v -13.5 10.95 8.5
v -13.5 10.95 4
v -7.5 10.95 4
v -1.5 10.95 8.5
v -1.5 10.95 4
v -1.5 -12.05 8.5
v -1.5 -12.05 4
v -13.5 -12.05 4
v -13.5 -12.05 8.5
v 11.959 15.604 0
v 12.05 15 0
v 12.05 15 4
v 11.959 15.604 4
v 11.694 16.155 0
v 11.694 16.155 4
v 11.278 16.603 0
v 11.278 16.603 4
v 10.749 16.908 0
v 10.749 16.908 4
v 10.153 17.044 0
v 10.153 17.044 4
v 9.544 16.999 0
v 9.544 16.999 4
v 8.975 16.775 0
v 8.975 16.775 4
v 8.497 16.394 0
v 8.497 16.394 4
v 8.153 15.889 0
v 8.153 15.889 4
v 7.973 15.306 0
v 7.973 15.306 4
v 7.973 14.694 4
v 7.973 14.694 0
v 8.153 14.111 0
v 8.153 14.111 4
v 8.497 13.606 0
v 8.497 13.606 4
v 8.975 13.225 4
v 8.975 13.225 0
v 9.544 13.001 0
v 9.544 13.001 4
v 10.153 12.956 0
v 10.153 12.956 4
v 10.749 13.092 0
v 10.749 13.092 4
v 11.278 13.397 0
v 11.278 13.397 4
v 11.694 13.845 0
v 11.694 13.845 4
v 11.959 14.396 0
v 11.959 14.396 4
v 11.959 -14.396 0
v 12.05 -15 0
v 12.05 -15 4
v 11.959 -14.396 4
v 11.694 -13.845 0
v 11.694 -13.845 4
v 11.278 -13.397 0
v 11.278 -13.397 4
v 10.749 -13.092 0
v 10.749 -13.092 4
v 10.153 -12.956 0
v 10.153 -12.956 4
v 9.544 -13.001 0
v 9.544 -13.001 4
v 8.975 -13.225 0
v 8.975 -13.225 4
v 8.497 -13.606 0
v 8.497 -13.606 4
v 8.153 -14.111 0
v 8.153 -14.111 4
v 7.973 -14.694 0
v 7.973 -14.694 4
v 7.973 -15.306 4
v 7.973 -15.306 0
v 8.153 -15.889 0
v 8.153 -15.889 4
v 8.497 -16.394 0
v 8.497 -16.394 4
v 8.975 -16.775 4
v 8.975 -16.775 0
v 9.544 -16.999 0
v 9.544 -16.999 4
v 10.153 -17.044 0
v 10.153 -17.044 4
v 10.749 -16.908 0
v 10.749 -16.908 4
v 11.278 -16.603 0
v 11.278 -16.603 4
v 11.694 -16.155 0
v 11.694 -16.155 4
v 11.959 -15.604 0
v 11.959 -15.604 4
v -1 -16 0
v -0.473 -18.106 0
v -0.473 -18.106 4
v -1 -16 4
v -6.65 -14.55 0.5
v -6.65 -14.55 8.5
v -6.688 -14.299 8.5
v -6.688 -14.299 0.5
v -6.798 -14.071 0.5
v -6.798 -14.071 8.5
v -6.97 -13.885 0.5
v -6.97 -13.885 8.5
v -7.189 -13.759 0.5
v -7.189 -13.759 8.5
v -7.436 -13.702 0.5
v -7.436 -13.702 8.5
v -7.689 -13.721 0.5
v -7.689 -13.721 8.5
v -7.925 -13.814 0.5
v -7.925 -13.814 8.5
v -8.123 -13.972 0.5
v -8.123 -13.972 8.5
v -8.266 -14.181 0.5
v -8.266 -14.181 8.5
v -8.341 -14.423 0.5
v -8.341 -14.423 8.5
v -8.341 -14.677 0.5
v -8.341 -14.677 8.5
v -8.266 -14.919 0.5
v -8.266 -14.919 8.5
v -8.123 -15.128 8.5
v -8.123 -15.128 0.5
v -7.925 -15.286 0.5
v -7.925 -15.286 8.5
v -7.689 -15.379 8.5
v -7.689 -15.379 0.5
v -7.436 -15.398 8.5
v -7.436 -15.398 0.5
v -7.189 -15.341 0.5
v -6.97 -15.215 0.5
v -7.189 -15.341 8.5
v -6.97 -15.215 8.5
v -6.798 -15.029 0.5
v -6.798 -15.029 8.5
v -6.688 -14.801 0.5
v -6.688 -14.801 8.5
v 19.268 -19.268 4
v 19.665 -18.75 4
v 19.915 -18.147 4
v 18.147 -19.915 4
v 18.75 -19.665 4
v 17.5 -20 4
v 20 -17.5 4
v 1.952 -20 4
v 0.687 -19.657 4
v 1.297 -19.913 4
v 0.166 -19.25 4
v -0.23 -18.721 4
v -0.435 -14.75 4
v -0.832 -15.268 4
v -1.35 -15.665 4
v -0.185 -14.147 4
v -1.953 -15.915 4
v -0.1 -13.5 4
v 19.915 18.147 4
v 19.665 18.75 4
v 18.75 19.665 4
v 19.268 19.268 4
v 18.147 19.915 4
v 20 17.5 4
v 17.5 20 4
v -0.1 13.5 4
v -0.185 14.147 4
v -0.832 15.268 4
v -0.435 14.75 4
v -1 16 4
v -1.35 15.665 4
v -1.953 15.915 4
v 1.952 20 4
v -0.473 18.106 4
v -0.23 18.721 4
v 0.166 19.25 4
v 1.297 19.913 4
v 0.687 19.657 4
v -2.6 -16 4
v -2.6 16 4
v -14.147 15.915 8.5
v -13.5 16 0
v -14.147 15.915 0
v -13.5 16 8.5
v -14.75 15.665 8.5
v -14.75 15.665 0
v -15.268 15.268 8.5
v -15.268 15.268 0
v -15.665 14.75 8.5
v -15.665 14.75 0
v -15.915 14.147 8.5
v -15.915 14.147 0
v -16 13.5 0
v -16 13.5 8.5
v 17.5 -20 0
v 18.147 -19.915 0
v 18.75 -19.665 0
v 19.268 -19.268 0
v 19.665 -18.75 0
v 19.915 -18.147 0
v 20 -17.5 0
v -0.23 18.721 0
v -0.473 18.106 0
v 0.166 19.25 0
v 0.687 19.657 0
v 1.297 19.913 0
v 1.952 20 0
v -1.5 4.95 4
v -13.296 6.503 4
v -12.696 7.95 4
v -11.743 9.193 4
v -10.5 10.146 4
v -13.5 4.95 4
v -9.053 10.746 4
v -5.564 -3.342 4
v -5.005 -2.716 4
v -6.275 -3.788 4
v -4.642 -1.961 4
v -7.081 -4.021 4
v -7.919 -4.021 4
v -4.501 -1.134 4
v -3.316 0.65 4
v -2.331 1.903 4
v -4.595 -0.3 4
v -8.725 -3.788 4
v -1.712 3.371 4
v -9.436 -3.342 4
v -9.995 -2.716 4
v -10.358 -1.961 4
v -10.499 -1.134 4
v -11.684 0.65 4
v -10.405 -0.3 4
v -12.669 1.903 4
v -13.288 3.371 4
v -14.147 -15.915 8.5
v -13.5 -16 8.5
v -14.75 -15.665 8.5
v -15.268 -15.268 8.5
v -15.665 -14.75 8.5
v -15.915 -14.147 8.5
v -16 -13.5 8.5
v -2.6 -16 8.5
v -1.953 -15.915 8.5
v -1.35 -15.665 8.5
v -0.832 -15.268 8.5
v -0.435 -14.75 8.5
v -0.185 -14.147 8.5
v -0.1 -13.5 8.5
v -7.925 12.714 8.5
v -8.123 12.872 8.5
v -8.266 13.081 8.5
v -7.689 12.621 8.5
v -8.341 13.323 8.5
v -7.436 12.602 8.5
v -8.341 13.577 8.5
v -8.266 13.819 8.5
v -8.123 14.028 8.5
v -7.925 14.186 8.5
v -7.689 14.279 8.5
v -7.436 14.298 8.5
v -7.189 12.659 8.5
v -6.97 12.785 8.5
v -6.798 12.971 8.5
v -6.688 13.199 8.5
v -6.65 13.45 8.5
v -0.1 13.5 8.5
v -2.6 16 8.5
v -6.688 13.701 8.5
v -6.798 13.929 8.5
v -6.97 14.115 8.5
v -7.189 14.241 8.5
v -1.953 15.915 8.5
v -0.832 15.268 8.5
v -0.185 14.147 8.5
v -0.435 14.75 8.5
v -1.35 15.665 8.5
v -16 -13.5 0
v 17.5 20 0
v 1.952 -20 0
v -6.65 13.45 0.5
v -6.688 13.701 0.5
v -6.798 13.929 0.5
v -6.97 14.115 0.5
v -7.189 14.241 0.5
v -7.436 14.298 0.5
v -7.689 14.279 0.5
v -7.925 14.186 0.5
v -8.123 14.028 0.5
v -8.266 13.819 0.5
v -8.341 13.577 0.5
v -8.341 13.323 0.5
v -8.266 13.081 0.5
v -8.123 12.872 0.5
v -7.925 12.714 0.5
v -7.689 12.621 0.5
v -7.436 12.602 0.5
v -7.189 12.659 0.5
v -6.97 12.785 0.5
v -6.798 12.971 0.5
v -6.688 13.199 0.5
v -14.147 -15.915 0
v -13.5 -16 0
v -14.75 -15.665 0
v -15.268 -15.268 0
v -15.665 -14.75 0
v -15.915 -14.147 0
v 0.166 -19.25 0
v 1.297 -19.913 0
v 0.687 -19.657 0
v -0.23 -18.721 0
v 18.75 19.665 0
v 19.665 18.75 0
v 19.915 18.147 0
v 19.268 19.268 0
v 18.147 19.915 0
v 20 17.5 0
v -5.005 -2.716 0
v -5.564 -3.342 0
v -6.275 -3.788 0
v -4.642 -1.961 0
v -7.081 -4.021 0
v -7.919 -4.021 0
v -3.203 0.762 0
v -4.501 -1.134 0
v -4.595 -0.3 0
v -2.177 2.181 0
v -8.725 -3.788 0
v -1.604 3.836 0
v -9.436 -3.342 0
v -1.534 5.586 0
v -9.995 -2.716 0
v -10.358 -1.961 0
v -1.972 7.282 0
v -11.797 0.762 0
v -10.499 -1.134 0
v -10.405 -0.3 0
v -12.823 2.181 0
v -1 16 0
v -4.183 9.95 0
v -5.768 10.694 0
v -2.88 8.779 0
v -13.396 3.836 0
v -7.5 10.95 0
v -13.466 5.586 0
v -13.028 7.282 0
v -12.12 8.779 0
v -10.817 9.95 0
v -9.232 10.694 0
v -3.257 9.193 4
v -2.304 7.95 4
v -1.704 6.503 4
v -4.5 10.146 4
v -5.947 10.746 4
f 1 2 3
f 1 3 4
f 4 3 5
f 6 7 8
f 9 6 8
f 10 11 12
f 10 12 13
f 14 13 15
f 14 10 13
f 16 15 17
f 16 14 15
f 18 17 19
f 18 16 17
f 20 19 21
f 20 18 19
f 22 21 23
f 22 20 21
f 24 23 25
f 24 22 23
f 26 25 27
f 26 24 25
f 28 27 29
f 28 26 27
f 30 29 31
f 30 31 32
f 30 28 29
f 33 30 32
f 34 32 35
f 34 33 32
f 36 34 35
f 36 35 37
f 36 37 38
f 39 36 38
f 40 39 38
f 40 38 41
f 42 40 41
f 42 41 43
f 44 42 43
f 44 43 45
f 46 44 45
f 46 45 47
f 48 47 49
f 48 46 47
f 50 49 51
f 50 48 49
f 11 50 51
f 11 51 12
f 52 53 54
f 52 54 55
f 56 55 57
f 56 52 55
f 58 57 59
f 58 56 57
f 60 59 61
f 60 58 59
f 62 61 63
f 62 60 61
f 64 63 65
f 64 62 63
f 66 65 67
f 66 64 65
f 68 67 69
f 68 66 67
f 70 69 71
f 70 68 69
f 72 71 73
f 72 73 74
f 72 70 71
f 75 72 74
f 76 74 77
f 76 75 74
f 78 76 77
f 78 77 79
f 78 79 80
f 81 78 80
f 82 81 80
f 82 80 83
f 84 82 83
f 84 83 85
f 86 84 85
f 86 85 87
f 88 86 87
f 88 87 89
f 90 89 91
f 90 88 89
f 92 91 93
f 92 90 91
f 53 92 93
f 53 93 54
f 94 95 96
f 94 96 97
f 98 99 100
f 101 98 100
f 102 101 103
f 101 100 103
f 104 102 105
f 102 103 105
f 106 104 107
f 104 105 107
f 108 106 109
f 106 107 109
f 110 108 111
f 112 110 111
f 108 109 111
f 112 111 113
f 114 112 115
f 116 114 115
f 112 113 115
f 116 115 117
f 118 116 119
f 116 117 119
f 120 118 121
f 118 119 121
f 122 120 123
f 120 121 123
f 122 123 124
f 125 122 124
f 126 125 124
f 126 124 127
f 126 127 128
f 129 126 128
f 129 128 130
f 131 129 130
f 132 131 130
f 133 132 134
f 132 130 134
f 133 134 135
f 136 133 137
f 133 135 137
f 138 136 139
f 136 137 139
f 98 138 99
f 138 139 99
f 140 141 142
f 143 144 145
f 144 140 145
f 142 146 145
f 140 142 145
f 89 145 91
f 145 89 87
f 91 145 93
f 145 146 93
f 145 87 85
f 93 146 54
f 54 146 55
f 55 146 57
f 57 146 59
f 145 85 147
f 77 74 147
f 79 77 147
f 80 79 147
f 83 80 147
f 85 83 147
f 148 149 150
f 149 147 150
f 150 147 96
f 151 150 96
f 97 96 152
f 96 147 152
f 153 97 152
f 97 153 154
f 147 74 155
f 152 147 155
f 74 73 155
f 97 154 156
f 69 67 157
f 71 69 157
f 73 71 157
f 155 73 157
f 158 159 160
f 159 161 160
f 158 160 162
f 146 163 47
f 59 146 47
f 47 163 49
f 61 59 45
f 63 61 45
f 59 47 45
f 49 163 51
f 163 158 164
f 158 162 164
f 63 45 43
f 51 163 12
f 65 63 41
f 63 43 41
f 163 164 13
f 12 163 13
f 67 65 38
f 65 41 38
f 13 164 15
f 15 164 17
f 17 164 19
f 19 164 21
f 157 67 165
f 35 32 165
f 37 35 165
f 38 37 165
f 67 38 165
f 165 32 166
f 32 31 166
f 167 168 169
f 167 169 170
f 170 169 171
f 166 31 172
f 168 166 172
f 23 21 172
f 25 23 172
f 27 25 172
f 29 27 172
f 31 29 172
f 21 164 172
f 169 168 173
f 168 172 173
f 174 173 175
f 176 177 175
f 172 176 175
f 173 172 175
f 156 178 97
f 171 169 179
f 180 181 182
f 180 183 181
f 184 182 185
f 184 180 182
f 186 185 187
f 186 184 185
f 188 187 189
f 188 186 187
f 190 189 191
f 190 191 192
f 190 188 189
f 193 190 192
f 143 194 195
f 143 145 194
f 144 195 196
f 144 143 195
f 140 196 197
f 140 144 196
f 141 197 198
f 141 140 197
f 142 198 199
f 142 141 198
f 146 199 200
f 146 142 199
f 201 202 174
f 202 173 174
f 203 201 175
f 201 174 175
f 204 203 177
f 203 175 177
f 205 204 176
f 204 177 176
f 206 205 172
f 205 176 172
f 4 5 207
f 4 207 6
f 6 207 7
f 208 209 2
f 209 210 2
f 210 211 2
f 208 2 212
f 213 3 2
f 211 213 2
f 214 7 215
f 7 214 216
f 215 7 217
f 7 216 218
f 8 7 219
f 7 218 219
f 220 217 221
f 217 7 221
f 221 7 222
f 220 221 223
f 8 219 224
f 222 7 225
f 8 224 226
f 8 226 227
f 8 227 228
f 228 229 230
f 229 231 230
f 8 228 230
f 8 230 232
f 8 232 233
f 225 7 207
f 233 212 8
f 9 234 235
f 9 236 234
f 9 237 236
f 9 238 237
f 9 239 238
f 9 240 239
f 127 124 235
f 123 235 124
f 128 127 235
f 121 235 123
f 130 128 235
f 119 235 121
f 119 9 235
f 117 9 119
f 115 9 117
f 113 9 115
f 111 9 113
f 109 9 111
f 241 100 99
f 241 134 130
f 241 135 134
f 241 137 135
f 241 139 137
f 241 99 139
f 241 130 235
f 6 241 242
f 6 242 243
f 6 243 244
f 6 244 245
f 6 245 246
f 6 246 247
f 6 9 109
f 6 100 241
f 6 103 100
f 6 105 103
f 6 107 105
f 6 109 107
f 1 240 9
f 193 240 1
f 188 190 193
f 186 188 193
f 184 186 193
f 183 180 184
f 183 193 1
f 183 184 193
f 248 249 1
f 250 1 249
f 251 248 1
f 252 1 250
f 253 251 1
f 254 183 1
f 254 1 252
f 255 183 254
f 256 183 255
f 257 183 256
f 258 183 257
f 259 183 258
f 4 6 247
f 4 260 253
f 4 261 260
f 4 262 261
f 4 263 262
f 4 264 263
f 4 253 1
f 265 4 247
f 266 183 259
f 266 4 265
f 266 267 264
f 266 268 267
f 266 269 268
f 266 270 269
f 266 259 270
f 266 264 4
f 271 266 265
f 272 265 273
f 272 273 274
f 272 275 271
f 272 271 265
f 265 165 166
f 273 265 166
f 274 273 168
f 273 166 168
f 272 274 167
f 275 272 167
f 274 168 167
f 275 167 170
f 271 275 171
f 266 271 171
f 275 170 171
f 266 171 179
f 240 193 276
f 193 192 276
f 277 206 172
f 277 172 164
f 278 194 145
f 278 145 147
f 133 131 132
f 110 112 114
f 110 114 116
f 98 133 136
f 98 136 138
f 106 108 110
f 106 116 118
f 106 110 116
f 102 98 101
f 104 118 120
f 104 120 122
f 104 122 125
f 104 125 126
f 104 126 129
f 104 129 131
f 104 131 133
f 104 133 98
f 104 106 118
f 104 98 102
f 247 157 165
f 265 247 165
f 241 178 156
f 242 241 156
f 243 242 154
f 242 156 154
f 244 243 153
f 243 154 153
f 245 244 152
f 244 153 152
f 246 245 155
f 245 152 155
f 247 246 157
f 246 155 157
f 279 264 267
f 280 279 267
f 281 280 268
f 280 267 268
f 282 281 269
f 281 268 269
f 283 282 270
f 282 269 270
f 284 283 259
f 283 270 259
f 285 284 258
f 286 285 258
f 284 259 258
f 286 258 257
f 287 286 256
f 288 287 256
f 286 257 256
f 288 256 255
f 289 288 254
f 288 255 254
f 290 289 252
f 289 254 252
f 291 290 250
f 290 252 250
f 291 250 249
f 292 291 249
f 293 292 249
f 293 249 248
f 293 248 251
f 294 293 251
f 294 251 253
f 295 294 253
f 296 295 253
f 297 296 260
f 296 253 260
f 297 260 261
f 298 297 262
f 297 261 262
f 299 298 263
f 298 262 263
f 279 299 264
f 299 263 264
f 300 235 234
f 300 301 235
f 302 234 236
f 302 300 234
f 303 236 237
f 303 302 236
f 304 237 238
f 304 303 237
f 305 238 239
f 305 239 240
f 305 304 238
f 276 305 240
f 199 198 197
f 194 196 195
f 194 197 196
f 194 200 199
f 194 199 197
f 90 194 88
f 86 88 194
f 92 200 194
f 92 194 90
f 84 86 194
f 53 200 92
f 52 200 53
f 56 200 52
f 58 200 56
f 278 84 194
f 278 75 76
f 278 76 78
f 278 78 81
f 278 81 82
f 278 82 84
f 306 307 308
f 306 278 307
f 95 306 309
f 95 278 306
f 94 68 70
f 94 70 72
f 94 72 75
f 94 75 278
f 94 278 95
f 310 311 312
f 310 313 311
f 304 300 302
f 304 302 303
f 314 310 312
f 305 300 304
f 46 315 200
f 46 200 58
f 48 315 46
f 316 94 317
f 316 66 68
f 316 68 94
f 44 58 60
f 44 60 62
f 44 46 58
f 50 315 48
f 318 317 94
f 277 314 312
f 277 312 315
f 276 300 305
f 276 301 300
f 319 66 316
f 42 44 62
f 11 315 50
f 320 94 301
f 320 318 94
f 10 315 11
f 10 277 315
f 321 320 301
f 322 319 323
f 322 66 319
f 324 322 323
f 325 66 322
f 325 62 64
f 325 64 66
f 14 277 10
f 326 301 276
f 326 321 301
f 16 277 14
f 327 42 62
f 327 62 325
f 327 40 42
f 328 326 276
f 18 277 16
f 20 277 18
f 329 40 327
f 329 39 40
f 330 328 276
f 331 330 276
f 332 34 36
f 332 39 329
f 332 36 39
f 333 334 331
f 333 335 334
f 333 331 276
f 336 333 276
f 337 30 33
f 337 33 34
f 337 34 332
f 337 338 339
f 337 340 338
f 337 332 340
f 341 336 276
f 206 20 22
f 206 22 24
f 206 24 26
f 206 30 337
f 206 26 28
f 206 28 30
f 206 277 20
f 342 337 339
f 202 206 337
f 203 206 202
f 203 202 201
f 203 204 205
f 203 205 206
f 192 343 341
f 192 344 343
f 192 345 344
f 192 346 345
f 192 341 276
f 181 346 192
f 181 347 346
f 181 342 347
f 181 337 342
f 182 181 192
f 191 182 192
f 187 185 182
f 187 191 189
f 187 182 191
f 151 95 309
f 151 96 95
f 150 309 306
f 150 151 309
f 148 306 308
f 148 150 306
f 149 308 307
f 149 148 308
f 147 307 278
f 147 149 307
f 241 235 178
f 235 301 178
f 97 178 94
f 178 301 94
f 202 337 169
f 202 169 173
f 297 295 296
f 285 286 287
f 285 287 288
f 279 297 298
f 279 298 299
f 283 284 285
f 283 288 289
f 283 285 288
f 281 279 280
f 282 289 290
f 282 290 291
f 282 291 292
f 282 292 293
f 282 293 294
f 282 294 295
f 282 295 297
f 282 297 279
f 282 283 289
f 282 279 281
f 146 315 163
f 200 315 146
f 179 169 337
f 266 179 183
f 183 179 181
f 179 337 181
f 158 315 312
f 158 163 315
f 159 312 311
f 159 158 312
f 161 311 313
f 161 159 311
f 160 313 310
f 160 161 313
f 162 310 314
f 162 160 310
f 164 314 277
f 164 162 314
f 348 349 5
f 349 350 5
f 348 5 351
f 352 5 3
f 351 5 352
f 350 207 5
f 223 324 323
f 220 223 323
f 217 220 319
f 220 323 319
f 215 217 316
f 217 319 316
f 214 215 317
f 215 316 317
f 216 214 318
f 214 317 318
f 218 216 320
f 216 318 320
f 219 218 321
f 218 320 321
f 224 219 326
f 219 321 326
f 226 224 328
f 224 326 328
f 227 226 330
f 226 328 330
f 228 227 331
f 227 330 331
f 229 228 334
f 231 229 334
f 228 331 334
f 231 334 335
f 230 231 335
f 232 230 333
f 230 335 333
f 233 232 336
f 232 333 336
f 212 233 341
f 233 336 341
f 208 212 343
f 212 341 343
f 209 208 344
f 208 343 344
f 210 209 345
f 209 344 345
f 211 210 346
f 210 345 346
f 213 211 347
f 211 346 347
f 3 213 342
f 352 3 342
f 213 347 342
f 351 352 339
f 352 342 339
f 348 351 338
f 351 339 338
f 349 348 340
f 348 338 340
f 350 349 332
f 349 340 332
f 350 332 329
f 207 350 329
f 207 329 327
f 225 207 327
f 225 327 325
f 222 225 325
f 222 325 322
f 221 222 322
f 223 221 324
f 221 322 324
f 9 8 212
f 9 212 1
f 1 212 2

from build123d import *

# Parameters (mm, degrees)
ESQUISSE1_R             = 2.05
BOSS_EXTRU_1_DEPTH      = 4
BOSS_EXTRU_2_DEPTH      = 4.5
ESQUISSE3_R             = 0.85
ENL_V_MAT_EXTRU_1_DEPTH = 8
CONG_1_R                = 2.5


with BuildPart() as part:
    # Esquisse1 → Boss.-Extru.1 (new body)
    with BuildSketch(Plane.XY):
        Polygon((0, 20), (20, 20), (20, -20), (0, -20), (-1, -16), (-16, -16), (-16, 16), (-1, 16), align=None)
        with Locations((10, 15)):
            Circle(ESQUISSE1_R, mode=Mode.SUBTRACT)
        with Locations((10, -15)):
            Circle(ESQUISSE1_R, mode=Mode.SUBTRACT)
        with BuildLine():
            ThreePointArc((-10.40473751, -0.3), (-7.5, 10.95), (-4.59526249, -0.3))
            ThreePointArc((-4.59526249, -0.3), (-7.5, -4.05), (-10.40473751, -0.3))
        make_face(mode=Mode.SUBTRACT)
    extrude(amount=BOSS_EXTRU_1_DEPTH)

    # Esquisse2 → Boss.-Extru.2 (add)
    with BuildSketch(Plane.XY.offset(4)):
        with BuildLine():
            Line((-0.1, -13.5), (-0.1, 13.5))
            ThreePointArc((-0.1, 13.5), (-0.832233047, 15.267766953), (-2.6, 16))
            Line((-2.6, 16), (-16, 16))
            Line((-16, 16), (-16, -16))
            Line((-16, -16), (-2.6, -16))
            ThreePointArc((-2.6, -16), (-0.832233047, -15.267766953), (-0.1, -13.5))
        make_face()
        Polygon((-1.5, 4.950000005), (-1.5, -12.05), (-13.5, -12.05), (-13.5, 4.95), (-13.5, 10.95), (-7.499999947, 10.95), (-1.5, 10.95), align=None, mode=Mode.SUBTRACT)
    extrude(amount=BOSS_EXTRU_2_DEPTH)

    # Esquisse3 → Enlèv. mat.-Extru.1 (cut)
    with BuildSketch(Plane.XY.offset(8.5)):
        with Locations((-7.5, 13.45)):
            Circle(ESQUISSE3_R)
        with Locations((-7.5, -14.55)):
            Circle(ESQUISSE3_R)
    extrude(amount=-ENL_V_MAT_EXTRU_1_DEPTH, mode=Mode.SUBTRACT)

    # Congé1
    cong_1_edges = [part.edges().sort_by_distance(p)[0] for p in [
        (-16, -16, 4.25),
        (-16, 16, 4.25),
        (0, 20, 2),
        (20, 20, 2),
        (20, -20, 2),
        (0, -20, 2),
    ]]
    fillet(cong_1_edges, radius=CONG_1_R)


solid = part.part
